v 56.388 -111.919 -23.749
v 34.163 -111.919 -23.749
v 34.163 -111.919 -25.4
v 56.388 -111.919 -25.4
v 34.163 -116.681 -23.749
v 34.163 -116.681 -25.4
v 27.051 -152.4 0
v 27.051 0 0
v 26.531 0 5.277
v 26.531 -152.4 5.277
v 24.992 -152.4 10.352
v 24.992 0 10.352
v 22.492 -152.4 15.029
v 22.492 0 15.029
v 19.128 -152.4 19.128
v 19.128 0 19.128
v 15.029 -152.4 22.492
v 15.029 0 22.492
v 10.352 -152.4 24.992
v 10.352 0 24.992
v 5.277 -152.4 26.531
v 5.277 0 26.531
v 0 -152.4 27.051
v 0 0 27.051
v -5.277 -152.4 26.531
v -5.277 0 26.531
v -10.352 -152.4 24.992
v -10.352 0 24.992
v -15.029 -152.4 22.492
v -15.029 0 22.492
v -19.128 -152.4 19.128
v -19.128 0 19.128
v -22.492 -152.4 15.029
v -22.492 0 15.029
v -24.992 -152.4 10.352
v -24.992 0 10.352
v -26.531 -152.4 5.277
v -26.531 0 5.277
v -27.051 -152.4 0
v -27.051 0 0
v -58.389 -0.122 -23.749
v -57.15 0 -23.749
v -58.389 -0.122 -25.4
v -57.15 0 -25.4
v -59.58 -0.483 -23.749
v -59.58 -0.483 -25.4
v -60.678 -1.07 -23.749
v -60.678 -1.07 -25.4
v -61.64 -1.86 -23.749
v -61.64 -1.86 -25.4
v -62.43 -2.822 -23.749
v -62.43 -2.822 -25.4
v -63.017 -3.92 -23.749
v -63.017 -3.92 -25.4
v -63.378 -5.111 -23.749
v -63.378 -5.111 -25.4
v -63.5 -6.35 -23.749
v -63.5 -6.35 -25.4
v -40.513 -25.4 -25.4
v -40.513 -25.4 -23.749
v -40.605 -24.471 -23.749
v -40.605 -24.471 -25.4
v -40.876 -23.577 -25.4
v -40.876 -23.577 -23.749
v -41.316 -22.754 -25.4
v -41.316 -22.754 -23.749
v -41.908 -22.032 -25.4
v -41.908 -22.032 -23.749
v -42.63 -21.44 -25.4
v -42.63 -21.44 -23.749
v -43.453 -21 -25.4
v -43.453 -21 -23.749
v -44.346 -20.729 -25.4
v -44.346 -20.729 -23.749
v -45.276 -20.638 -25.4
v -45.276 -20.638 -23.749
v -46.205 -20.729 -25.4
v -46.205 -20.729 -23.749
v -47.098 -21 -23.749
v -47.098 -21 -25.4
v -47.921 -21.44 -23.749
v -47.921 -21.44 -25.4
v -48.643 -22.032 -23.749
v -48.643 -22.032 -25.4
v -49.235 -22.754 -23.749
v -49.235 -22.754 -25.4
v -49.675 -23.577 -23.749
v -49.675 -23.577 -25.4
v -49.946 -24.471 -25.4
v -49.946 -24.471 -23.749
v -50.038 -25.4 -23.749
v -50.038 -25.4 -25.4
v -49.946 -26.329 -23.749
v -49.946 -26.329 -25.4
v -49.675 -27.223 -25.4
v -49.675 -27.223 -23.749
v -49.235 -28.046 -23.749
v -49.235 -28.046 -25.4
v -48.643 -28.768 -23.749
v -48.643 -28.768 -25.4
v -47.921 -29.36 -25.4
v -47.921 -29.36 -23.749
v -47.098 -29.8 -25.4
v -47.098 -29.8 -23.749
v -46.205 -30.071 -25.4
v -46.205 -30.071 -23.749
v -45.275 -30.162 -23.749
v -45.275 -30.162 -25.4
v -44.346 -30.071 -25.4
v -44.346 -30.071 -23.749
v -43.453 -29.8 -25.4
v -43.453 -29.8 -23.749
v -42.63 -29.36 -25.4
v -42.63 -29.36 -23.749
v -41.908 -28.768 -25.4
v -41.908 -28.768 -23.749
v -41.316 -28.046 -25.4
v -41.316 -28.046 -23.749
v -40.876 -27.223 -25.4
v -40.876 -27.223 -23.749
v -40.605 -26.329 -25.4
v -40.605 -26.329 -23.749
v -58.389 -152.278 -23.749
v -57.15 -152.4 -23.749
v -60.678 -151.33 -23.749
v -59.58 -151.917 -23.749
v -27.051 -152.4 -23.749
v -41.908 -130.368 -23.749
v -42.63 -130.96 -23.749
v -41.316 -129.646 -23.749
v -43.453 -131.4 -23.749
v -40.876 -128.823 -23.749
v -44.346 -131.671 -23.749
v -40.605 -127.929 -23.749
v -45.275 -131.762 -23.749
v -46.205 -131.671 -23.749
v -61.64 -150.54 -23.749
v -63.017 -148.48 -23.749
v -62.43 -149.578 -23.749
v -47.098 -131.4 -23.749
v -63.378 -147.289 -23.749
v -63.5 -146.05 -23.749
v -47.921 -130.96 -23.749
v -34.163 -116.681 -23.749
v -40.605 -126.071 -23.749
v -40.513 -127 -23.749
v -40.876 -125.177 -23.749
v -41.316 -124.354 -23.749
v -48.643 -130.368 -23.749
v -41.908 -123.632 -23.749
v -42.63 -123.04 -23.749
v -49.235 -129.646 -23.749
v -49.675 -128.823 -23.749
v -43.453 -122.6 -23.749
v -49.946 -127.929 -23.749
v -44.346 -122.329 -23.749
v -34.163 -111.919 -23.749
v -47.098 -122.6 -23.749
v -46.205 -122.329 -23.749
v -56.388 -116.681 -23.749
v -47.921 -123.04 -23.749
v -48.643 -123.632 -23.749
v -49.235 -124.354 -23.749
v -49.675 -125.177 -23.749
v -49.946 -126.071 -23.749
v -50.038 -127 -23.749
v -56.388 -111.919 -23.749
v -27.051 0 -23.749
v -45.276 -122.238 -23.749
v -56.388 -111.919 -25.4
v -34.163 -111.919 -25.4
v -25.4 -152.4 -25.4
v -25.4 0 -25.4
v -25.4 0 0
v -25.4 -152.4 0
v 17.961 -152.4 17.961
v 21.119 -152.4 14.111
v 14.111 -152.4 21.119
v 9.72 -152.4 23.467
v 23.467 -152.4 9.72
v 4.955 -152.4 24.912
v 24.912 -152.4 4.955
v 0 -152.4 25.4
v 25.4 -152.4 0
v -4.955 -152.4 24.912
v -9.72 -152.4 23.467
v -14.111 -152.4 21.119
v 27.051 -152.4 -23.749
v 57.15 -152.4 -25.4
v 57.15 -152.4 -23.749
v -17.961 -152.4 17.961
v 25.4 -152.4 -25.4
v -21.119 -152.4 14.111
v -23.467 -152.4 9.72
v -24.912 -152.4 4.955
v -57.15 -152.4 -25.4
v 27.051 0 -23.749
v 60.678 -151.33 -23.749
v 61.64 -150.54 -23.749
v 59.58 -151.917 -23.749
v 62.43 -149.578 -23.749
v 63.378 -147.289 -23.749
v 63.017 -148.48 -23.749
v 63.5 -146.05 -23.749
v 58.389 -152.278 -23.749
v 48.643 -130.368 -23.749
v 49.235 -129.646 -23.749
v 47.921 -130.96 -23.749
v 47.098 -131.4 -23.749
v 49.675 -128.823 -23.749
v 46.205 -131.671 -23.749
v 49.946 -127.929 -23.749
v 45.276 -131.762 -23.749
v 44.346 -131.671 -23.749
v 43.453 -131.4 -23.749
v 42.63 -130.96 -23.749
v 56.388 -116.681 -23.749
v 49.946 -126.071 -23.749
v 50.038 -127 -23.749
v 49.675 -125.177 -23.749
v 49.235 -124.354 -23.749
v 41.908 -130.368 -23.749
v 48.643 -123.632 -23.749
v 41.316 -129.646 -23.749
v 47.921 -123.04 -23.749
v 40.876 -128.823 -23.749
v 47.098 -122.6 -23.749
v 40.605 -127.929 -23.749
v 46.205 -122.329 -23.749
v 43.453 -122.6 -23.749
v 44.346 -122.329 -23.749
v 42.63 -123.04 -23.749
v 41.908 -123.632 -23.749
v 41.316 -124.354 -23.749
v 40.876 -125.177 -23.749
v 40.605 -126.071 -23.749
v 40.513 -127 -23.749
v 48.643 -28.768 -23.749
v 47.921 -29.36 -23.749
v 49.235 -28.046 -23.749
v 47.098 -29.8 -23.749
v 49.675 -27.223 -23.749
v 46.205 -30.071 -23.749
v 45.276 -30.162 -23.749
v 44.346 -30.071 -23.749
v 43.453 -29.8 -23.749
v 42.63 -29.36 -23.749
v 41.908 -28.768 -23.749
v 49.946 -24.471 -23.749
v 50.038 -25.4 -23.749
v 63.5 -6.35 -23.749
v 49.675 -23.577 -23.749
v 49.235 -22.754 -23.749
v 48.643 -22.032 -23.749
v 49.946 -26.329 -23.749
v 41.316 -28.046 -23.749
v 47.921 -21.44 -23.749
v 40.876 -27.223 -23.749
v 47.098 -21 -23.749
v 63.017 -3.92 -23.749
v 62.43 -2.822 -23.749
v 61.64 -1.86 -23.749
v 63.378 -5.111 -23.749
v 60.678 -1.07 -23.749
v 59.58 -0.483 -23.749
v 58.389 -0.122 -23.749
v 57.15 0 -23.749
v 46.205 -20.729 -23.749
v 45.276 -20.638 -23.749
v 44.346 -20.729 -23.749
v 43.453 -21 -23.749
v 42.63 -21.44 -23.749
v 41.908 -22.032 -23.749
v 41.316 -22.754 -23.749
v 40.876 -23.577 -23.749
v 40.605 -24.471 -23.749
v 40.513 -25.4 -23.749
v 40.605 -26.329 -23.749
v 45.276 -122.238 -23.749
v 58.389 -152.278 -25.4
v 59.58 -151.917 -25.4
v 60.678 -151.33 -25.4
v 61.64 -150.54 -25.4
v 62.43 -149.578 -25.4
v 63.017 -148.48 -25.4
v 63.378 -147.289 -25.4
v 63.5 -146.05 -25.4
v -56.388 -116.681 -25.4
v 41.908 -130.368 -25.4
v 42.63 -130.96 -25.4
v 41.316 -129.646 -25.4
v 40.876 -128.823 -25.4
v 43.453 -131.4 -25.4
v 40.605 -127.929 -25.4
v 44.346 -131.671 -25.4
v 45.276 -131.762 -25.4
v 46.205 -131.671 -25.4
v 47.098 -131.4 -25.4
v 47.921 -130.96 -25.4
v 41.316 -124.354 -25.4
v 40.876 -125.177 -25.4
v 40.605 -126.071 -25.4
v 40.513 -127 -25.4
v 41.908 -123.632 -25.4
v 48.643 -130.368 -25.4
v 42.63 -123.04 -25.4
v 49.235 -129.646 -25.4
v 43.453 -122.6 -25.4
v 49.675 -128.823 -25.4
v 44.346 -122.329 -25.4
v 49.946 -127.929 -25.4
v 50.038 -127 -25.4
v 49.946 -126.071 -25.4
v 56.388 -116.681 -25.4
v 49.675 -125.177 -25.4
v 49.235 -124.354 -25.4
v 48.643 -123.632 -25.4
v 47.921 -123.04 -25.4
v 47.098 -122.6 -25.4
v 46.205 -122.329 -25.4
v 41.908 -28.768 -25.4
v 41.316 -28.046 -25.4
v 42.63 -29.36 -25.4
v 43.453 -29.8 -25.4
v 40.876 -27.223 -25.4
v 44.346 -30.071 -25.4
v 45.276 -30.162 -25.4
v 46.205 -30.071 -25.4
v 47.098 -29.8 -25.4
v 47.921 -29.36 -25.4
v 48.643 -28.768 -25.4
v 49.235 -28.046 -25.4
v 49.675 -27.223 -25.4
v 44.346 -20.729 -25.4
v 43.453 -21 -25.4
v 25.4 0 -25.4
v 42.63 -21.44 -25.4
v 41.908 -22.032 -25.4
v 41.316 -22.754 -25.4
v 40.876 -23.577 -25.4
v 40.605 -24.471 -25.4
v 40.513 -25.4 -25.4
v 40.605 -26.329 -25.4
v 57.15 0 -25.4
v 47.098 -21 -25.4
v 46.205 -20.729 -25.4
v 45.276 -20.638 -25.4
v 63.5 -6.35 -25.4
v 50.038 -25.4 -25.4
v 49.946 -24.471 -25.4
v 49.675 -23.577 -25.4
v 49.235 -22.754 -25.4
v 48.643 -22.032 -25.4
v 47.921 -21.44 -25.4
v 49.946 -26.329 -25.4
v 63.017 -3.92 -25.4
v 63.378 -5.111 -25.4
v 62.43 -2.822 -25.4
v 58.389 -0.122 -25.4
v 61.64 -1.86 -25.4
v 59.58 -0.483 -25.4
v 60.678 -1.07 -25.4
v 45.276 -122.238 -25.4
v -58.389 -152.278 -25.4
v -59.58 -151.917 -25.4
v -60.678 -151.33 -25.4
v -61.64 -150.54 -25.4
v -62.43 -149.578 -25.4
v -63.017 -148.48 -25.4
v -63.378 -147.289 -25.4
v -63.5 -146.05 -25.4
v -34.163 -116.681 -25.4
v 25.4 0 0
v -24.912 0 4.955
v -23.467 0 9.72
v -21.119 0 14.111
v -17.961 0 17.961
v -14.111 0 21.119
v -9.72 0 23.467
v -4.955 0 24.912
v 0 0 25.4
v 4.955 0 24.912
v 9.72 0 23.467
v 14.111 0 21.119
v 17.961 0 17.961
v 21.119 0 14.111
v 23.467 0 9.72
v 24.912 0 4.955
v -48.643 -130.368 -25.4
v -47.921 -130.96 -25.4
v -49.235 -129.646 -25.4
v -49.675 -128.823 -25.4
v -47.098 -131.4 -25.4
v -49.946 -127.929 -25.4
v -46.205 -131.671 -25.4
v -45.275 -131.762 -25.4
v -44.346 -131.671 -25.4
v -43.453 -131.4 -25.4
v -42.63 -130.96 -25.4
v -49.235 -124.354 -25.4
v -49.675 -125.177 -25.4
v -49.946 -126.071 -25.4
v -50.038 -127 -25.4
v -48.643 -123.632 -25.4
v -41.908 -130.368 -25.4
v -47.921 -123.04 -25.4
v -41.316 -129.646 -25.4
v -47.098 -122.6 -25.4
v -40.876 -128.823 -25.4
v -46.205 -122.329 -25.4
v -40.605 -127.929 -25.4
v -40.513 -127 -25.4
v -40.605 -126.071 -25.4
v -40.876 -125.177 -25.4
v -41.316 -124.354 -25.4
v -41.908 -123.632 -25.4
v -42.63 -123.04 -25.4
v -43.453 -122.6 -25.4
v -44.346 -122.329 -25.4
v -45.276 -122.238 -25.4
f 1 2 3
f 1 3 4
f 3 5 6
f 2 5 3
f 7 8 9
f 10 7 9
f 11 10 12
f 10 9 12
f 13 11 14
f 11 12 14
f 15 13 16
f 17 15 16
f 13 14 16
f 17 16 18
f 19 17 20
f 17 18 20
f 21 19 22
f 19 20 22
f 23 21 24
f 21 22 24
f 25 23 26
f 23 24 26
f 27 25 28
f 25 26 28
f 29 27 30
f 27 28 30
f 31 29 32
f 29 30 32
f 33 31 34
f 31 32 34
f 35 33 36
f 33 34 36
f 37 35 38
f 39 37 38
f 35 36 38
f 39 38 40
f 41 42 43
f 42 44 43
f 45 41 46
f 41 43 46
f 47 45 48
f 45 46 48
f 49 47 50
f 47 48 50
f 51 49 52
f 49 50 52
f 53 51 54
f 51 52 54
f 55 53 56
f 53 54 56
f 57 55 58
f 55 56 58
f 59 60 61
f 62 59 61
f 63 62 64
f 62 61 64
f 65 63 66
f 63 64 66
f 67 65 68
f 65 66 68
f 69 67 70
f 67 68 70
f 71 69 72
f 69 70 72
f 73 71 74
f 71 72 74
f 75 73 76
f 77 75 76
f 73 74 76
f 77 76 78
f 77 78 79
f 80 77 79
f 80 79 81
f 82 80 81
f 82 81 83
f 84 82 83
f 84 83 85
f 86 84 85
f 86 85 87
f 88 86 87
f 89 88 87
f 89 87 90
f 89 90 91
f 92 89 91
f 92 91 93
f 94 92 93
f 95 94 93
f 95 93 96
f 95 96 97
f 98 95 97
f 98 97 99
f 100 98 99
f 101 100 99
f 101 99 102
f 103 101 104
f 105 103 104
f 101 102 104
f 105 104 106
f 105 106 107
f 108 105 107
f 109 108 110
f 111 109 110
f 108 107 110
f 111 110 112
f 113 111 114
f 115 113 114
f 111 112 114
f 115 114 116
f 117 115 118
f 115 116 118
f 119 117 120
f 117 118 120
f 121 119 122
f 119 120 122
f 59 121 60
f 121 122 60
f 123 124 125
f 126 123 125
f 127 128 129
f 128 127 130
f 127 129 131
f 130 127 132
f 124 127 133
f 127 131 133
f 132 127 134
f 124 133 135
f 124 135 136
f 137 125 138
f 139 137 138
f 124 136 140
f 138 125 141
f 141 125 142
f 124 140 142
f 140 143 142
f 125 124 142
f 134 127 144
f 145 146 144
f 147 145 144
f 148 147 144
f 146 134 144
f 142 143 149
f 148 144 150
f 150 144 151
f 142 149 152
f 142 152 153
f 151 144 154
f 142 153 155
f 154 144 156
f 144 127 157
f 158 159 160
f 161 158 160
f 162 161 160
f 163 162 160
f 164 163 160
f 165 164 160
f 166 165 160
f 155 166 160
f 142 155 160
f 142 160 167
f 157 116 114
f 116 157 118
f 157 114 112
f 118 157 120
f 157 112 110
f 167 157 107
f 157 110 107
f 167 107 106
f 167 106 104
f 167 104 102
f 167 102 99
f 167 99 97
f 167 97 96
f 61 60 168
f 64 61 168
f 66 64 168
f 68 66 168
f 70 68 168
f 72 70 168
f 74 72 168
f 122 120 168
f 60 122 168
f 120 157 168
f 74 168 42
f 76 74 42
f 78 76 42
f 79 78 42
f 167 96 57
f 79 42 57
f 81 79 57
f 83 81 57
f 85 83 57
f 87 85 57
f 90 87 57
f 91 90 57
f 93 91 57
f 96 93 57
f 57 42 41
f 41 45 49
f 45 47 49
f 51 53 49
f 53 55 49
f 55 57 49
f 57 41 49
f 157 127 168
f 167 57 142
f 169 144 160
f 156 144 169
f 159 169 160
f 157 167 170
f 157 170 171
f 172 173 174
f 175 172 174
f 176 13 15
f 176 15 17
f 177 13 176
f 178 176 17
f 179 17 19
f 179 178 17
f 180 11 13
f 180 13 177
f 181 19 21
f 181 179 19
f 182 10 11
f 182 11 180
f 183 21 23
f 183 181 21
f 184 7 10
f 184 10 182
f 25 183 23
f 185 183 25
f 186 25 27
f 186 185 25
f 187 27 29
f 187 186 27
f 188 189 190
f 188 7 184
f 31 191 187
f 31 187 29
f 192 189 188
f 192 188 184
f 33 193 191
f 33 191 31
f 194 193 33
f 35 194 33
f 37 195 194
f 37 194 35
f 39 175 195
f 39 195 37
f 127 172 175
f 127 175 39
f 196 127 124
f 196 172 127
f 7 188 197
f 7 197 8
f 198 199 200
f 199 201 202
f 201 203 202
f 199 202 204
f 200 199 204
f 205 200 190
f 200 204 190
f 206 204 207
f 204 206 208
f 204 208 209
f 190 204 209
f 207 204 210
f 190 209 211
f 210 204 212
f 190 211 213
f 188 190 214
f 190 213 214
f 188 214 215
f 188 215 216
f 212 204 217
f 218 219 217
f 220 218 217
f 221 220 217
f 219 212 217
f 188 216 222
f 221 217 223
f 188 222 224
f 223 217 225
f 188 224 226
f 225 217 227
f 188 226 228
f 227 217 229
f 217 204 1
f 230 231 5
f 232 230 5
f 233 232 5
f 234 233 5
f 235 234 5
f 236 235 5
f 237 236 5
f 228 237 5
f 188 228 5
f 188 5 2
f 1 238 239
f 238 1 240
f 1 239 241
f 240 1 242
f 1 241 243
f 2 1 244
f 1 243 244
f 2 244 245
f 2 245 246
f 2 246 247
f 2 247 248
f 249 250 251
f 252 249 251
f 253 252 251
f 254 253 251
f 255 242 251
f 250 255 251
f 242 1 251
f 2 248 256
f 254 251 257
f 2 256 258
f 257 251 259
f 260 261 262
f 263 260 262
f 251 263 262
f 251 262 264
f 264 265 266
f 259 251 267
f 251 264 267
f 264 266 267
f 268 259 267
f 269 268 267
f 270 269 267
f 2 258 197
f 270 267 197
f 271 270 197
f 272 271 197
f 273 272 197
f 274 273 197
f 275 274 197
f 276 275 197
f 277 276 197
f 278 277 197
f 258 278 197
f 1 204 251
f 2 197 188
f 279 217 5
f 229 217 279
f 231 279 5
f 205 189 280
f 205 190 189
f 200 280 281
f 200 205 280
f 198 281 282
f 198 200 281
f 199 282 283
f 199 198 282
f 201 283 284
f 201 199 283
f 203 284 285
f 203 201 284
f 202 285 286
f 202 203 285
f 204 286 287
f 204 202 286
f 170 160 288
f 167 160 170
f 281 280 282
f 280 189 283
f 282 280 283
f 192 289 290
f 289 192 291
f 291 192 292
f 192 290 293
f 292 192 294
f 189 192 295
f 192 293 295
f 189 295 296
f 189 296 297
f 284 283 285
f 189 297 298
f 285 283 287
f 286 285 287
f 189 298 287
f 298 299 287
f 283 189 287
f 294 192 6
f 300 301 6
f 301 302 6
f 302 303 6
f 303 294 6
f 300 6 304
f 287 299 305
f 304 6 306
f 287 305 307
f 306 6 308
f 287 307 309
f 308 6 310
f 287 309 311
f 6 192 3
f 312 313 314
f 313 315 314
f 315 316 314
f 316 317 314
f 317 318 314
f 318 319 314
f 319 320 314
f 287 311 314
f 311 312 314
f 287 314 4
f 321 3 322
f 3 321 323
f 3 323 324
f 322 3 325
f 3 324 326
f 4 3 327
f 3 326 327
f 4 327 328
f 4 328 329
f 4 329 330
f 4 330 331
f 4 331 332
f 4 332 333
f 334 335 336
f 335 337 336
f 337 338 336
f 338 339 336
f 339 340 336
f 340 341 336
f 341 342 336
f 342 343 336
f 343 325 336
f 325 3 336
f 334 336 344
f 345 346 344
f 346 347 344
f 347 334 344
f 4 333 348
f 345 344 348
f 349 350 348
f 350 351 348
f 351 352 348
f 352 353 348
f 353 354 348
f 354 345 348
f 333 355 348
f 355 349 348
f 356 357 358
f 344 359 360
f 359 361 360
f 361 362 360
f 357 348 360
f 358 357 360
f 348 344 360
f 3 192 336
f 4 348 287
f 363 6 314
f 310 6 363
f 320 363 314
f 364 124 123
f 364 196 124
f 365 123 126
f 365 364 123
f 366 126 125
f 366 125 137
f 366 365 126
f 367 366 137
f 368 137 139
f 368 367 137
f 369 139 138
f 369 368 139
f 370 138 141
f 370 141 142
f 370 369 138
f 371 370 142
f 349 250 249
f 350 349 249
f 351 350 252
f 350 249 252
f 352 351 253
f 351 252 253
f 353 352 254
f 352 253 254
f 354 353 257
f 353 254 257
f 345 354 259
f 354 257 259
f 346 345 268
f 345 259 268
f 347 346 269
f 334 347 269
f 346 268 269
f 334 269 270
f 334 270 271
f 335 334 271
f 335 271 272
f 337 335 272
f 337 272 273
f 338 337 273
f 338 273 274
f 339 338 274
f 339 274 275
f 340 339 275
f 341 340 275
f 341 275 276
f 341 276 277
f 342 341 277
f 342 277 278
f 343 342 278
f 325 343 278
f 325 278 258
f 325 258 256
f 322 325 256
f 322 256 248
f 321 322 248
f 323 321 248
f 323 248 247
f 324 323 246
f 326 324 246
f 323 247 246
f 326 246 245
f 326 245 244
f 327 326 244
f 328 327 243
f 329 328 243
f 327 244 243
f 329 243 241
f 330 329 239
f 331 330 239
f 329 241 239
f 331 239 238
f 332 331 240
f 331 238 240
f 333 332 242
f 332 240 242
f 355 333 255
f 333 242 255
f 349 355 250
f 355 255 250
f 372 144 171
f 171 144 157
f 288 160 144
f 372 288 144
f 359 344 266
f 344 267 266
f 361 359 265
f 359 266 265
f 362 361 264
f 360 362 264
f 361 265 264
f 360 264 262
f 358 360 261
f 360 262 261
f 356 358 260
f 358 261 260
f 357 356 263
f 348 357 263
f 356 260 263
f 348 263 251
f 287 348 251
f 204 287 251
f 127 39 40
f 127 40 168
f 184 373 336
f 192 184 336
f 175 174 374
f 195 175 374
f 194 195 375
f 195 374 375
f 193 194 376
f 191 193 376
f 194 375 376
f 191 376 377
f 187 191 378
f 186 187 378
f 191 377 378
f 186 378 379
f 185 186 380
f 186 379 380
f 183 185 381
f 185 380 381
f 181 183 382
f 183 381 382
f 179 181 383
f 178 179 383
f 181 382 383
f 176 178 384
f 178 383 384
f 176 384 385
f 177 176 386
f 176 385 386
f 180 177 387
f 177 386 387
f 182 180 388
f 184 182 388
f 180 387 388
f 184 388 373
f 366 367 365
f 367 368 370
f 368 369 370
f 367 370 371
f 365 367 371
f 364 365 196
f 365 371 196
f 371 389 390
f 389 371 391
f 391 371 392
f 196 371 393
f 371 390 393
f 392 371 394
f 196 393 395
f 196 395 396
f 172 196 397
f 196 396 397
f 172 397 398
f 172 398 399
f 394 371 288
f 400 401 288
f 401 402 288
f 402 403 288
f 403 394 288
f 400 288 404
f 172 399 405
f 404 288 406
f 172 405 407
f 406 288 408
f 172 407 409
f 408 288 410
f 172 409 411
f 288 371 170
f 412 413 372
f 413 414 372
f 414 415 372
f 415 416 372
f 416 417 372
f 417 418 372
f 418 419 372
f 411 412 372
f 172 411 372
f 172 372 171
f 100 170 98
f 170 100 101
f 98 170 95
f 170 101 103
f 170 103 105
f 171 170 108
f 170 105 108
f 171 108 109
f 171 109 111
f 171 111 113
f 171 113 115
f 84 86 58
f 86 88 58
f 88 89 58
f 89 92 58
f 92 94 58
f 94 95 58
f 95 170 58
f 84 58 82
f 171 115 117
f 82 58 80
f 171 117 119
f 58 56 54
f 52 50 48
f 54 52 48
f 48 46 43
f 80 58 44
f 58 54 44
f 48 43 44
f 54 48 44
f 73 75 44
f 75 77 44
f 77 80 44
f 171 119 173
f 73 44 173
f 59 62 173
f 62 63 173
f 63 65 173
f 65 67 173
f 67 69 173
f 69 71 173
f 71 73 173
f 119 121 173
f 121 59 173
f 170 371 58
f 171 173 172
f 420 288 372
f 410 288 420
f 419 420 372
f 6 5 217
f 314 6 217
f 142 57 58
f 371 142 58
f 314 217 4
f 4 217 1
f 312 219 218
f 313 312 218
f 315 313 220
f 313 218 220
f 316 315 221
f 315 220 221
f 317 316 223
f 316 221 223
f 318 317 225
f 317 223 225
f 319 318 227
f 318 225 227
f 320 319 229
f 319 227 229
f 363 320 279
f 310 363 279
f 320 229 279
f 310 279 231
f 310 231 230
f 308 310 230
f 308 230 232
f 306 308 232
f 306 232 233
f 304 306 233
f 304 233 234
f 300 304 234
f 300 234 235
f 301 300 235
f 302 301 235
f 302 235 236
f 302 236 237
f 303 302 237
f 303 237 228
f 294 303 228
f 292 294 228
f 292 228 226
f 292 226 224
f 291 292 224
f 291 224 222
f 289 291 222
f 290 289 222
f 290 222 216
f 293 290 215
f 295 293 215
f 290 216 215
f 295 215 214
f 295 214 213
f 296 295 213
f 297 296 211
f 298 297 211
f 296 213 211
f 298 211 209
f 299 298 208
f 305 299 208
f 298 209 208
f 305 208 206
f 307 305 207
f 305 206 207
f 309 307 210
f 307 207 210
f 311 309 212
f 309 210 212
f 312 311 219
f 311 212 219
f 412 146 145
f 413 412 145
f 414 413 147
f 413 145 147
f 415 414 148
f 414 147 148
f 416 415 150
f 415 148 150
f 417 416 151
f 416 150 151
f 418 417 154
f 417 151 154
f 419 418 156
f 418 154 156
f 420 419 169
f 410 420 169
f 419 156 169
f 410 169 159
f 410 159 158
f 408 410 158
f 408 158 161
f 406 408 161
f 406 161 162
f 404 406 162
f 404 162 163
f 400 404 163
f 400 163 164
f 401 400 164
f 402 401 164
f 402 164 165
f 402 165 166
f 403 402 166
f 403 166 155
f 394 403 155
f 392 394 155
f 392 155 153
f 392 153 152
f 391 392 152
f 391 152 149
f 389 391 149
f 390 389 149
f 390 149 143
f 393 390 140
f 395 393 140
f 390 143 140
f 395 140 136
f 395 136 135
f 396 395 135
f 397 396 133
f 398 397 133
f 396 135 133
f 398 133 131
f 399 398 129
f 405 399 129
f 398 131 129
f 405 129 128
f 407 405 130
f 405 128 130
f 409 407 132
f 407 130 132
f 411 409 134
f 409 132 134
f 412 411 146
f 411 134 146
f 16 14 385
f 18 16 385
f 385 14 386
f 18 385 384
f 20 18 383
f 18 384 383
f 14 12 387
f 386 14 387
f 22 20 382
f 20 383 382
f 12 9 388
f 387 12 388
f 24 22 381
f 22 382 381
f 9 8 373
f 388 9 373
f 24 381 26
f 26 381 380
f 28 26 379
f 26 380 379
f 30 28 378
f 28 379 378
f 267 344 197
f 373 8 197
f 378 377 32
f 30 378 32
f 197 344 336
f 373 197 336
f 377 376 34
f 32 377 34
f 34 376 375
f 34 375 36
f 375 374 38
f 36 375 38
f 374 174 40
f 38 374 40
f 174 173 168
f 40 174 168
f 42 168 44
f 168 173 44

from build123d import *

# Parameters (mm, degrees)
BOSS_EXTRUDE1_DEPTH = 152.4
SKETCH2_R           = 4.7625
CUT_EXTRUDE1_DEPTH  = 50.8
FILLET1_R           = 6.35
SKETCH3_W           = 22.225
SKETCH3_H           = 4.7625
CUT_EXTRUDE3_DEPTH  = 2.651


with BuildPart() as part:
    # Sketch1 → Boss-Extrude1 (new body)
    with BuildSketch(Plane(origin=(0, 0, 0), x_dir=(1, 0, 0), z_dir=(0, 1, 0))):
        with BuildLine():
            Line((-27.051, 0), (-27.051, 23.749))
            Line((-27.051, 23.749), (-63.5, 23.749))
            Line((-63.5, 23.749), (-63.5, 25.4))
            Line((-63.5, 25.4), (-25.4, 25.4))
            Line((-25.4, 25.4), (-25.4, 0))
            ThreePointArc((-25.4, 0), (0, -25.4), (25.4, 0))
            Line((25.4, 0), (25.4, 25.4))
            Line((25.4, 25.4), (63.5, 25.4))
            Line((63.5, 25.4), (63.5, 23.749))
            Line((63.5, 23.749), (27.051, 23.749))
            Line((27.051, 23.749), (27.051, 0))
            ThreePointArc((27.051, 0), (0, -27.051), (-27.051, 0))
        make_face()
    extrude(amount=-BOSS_EXTRUDE1_DEPTH)

    # Sketch2 → Cut-Extrude1 (cut)
    with BuildSketch(Plane.XY.offset(-23.749)):
        with Locations((-45.2755, -25.4)):
            Circle(SKETCH2_R)
        with Locations((45.2755, -25.4)):
            Circle(SKETCH2_R)
        with Locations((-45.2755, -127)):
            Circle(SKETCH2_R)
        with Locations((45.2755, -127)):
            Circle(SKETCH2_R)
    extrude(amount=-CUT_EXTRUDE1_DEPTH, mode=Mode.SUBTRACT)

    # Fillet1
    fillet1_edges = [part.edges().sort_by_distance(p)[0] for p in [
        (63.5, 0, -24.5745),
        (-63.5, 0, -24.5745),
        (-63.5, -152.4, -24.5745),
        (63.5, -152.4, -24.5745),
    ]]
    fillet(fillet1_edges, radius=FILLET1_R)

    # Sketch3 → Cut-Extrude3 (cut, through all)
    with BuildSketch(Plane.XY.offset(-23.749)):
        with Locations((45.2755, -114.3)):
            Rectangle(SKETCH3_W, SKETCH3_H)
        with Locations((-45.2755, -114.3)):
            Rectangle(SKETCH3_W, SKETCH3_H)
    extrude(amount=-CUT_EXTRUDE3_DEPTH, mode=Mode.SUBTRACT)


solid = part.part
